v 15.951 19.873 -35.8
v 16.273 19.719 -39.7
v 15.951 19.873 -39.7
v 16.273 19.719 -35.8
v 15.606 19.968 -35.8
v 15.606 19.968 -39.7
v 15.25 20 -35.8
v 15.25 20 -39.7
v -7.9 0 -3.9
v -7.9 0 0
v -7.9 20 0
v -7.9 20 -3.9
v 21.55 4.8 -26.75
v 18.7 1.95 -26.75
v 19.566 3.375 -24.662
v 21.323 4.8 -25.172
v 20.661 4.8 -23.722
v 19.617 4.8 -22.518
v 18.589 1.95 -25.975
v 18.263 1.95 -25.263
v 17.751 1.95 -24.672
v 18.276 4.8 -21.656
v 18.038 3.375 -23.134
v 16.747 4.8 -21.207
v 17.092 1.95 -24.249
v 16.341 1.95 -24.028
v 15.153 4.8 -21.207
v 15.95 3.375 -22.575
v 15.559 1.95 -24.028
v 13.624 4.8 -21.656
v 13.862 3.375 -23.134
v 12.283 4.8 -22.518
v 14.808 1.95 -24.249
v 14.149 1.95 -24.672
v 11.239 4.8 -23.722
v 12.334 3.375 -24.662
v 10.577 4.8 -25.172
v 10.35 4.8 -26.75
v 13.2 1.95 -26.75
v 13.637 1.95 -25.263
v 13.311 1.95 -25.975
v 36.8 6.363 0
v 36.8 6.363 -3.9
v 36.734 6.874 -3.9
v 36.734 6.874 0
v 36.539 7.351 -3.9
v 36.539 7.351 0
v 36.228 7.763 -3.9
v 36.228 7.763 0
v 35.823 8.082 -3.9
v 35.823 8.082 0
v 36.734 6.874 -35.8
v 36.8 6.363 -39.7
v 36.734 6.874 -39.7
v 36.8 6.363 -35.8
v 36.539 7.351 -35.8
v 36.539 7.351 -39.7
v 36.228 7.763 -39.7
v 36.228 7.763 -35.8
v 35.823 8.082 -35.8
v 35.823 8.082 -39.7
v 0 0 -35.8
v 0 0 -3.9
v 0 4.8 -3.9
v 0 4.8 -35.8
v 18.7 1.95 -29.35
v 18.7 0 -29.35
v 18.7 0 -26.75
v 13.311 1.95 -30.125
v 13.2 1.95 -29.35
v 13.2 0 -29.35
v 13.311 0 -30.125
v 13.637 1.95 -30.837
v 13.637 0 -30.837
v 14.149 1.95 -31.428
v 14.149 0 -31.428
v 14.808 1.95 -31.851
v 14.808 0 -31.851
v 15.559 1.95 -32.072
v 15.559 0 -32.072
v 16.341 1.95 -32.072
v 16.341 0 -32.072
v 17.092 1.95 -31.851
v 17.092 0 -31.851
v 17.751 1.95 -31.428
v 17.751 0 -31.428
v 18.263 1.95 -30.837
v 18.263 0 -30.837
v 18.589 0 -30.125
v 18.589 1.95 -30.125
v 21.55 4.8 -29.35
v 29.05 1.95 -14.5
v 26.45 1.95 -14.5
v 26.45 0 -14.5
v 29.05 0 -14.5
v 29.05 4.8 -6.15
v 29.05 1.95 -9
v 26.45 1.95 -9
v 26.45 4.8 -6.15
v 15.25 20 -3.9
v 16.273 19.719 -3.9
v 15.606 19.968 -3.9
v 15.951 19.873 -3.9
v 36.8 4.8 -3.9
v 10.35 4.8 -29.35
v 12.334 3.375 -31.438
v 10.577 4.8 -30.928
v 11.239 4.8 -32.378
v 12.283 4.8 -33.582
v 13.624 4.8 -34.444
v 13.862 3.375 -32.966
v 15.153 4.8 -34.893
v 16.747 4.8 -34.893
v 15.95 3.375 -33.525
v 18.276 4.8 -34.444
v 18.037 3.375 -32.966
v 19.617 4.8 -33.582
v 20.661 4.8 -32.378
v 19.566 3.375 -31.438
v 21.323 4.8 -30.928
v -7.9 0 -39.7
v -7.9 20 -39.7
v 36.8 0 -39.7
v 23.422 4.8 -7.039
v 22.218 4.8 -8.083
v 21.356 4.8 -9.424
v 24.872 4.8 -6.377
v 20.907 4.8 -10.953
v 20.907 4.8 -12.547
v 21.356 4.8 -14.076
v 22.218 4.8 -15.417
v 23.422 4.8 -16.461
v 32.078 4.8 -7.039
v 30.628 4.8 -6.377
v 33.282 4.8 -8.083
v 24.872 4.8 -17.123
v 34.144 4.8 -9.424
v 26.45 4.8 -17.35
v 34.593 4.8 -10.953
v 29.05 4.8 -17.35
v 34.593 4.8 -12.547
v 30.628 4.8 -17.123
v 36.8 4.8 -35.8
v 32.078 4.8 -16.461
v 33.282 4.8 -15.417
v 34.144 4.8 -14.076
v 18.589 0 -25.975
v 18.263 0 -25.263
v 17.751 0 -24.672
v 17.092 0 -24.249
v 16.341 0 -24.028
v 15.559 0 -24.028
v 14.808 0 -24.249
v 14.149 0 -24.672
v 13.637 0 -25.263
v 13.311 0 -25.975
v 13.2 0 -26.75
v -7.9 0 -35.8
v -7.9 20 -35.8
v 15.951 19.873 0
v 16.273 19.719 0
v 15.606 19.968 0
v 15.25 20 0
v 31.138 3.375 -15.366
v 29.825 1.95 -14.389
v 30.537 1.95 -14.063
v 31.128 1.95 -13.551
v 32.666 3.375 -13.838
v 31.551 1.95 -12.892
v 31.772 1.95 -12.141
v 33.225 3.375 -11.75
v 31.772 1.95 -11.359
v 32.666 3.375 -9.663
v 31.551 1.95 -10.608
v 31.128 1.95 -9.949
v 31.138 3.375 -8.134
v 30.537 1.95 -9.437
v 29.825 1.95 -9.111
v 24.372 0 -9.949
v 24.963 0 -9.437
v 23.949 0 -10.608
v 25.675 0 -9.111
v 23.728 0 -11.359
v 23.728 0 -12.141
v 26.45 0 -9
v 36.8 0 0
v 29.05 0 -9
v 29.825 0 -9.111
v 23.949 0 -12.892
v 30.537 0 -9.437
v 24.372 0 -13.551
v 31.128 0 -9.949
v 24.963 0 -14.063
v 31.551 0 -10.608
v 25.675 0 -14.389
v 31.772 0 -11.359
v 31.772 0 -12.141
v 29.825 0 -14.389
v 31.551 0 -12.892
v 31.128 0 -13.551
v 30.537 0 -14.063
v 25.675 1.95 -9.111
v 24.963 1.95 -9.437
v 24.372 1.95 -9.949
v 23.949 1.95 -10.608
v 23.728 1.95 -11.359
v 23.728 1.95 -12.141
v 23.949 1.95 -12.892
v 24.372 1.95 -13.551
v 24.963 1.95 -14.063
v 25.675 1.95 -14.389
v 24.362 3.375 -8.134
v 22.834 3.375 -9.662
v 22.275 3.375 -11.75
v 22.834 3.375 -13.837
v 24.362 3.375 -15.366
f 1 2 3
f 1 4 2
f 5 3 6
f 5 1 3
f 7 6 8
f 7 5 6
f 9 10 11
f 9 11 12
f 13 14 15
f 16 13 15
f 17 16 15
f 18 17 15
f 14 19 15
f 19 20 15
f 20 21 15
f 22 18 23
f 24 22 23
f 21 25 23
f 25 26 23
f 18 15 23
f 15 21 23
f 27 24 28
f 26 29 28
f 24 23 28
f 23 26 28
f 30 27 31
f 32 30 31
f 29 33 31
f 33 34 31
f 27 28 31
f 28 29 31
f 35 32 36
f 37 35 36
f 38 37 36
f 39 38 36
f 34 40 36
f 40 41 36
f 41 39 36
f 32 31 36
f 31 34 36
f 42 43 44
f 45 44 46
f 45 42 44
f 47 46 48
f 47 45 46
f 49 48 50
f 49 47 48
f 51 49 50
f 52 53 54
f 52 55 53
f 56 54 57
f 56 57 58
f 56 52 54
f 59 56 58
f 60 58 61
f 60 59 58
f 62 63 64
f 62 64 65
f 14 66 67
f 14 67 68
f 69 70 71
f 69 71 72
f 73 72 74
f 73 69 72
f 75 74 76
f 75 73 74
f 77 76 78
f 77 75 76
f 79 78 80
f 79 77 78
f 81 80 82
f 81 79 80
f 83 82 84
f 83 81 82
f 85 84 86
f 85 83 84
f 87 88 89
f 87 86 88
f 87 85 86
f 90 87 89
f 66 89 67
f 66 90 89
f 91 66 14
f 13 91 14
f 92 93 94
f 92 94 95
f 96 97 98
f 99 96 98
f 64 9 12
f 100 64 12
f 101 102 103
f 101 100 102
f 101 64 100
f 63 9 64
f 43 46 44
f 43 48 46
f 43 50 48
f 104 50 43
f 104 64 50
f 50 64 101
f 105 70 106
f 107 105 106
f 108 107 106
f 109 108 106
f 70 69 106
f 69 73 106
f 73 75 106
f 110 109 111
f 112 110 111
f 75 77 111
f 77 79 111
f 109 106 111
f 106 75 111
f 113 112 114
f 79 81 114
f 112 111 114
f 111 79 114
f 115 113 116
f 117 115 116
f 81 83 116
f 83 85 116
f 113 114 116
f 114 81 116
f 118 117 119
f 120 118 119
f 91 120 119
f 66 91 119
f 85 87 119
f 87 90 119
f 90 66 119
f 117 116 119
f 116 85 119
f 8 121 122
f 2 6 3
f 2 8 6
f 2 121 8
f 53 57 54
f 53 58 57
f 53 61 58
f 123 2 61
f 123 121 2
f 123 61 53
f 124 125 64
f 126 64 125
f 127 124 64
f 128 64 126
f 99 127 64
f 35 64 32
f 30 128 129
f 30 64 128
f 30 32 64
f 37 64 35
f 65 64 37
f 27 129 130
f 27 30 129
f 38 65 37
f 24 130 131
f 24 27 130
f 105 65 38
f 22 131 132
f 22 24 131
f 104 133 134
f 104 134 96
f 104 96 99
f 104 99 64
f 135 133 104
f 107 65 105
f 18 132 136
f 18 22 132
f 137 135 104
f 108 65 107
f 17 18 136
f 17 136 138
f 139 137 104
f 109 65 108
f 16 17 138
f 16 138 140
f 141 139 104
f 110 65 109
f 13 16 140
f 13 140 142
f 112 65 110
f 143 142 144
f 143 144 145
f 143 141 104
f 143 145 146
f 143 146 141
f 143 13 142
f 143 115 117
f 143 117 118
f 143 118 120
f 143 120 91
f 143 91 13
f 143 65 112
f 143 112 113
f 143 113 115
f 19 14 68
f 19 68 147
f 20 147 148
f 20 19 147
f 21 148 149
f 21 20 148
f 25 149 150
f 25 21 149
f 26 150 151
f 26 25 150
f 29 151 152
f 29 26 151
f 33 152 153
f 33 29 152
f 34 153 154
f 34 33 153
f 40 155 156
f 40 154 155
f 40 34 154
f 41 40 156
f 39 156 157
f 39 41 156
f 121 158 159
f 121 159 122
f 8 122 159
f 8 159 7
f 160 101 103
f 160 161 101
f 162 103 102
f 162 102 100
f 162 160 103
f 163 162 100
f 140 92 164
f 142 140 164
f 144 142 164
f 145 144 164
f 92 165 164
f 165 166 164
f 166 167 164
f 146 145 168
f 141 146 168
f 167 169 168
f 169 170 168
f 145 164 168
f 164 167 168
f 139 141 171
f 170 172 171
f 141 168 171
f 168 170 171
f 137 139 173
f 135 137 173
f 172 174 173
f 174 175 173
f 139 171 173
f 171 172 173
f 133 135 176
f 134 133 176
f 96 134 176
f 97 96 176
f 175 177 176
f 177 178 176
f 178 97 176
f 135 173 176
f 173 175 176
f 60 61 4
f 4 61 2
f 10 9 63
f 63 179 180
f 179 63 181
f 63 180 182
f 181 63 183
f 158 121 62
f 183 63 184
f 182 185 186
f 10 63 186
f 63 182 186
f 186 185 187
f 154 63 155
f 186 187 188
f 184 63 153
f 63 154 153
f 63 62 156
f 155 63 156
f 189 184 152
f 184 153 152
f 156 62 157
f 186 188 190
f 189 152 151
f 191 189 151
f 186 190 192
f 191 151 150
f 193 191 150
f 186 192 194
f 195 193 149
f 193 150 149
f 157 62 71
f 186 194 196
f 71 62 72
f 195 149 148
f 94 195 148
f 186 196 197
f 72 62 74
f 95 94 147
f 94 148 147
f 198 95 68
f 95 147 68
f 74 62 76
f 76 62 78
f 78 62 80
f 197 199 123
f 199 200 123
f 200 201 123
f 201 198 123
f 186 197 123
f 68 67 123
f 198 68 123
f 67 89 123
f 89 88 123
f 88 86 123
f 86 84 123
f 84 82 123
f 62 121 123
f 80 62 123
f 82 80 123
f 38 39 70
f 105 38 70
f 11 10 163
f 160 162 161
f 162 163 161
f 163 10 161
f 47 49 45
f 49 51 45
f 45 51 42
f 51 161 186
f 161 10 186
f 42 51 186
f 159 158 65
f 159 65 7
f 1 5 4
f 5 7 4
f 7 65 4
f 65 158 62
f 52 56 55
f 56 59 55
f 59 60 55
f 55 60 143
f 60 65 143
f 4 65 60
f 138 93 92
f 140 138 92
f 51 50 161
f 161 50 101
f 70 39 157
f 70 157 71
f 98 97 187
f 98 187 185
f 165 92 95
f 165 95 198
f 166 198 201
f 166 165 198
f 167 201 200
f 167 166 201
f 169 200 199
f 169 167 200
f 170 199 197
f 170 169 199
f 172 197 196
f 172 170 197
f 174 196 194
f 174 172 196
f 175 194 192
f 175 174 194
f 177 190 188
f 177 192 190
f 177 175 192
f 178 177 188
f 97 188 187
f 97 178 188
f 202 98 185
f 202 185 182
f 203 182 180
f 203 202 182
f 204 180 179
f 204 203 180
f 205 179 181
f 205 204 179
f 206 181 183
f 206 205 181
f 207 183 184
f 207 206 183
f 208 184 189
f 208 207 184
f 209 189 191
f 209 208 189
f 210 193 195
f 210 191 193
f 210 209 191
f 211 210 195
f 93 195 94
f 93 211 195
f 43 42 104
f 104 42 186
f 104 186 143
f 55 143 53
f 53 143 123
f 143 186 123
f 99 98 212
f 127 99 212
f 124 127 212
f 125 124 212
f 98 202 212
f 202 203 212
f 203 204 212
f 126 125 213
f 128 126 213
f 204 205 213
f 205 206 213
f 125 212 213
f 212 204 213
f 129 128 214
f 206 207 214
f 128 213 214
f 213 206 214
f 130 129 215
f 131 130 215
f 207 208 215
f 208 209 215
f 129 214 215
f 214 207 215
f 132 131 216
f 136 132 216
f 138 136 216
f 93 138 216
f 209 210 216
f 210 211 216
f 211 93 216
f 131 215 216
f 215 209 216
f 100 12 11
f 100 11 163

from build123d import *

# Parameters (mm, degrees)
SKETCH1_W           = 36.8
SKETCH1_H           = 39.7
BOSS_EXTRUDE1_DEPTH = 4.8
SKETCH2_W           = 44.7
SKETCH2_H           = 3.9
BOSS_EXTRUDE2_DEPTH = 20
CUT_EXTRUDE1_REACH  = 58.226
CHAMFER1_SIZE       = 2.85
CUT_EXTRUDE2_DEPTH  = 58.709011428
FILLET1_R           = 2


with BuildPart() as part:
    # Sketch1 → Boss-Extrude1 (new body)
    with BuildSketch(Plane(origin=(0, 0, 0), x_dir=(1, 0, 0), z_dir=(0, 1, 0))):
        with Locations((18.4, 19.85)):
            Rectangle(SKETCH1_W, SKETCH1_H)
    extrude(amount=BOSS_EXTRUDE1_DEPTH)

    # Sketch2 → Boss-Extrude2 (add)
    with BuildSketch(Plane(origin=(0, 0, 0), x_dir=(1, 0, 0), z_dir=(0, 1, 0))):
        with Locations((14.45, 37.75)):
            Rectangle(SKETCH2_W, SKETCH2_H)
        with Locations((14.45, 1.95)):
            Rectangle(SKETCH2_W, SKETCH2_H)
    extrude(amount=BOSS_EXTRUDE2_DEPTH)

    # Sketch3 → Cut-Extrude1 (cut, up to next)
    with BuildSketch(Plane(origin=(0, 4.8, 0), x_dir=(1, 0, 0), z_dir=(0, 1, 0)), mode=Mode.PRIVATE) as cut_extrude1_sk1:
        with BuildLine():
            Line((26.45, 14.5), (29.05, 14.5))
            ThreePointArc((29.05, 14.5), (31.8, 11.75), (29.05, 9))
            Line((29.05, 9), (26.45, 9))
            ThreePointArc((26.45, 9), (23.7, 11.75), (26.45, 14.5))
        make_face()
    cut_extrude1_tool1 = extrude(cut_extrude1_sk1.sketch, amount=-CUT_EXTRUDE1_REACH, mode=Mode.PRIVATE) & part.part
    # Sketch3 → Cut-Extrude1 (cut, up to next)
    with BuildSketch(Plane(origin=(0, 4.8, 0), x_dir=(1, 0, 0), z_dir=(0, 1, 0)), mode=Mode.PRIVATE) as cut_extrude1_sk2:
        with BuildLine():
            Line((18.7, 29.35), (18.7, 26.75))
            ThreePointArc((18.7, 26.75), (15.95, 24), (13.2, 26.75))
            Line((13.2, 26.75), (13.2, 29.35))
            ThreePointArc((13.2, 29.35), (15.95, 32.1), (18.7, 29.35))
        make_face()
    cut_extrude1_tool2 = extrude(cut_extrude1_sk2.sketch, amount=-CUT_EXTRUDE1_REACH, mode=Mode.PRIVATE) & part.part
    add(cut_extrude1_tool1.solids().sort_by_distance((27.75, 4.8, -11.75))[0], mode=Mode.SUBTRACT)
    add(cut_extrude1_tool2.solids().sort_by_distance((15.95, 4.8, -28.05))[0], mode=Mode.SUBTRACT)

    # Chamfer1
    chamfer1_edges = [part.edges().sort_by_distance(p)[0] for p in [
        (23.7, 4.8, -11.75),
        (27.75, 4.8, -9),
        (31.8, 4.8, -11.75),
        (27.75, 4.8, -14.5),
        (15.95, 4.8, -32.1),
        (13.2, 4.8, -28.05),
        (15.95, 4.8, -24),
        (18.7, 4.8, -28.05),
    ]]
    chamfer(chamfer1_edges, length=CHAMFER1_SIZE)

    # Sketch4 → Cut-Extrude2 (cut, through all)
    with BuildSketch(Plane(origin=(0, 0, -39.7), x_dir=(-1, 0, 0), z_dir=(0, 0, -1))):
        Polygon((-36.8, 20), (-36.8, 7.5), (-15.8, 20), align=None)
    extrude(amount=-CUT_EXTRUDE2_DEPTH, mode=Mode.SUBTRACT)

    # Fillet1
    fillet1_edges = [part.edges().sort_by_distance(p)[0] for p in [
        (15.8, 20, -37.75),
        (15.8, 20, -1.95),
        (36.8, 7.5, -37.75),
        (36.8, 7.5, -1.95),
    ]]
    fillet(fillet1_edges, radius=FILLET1_R)


solid = part.part
